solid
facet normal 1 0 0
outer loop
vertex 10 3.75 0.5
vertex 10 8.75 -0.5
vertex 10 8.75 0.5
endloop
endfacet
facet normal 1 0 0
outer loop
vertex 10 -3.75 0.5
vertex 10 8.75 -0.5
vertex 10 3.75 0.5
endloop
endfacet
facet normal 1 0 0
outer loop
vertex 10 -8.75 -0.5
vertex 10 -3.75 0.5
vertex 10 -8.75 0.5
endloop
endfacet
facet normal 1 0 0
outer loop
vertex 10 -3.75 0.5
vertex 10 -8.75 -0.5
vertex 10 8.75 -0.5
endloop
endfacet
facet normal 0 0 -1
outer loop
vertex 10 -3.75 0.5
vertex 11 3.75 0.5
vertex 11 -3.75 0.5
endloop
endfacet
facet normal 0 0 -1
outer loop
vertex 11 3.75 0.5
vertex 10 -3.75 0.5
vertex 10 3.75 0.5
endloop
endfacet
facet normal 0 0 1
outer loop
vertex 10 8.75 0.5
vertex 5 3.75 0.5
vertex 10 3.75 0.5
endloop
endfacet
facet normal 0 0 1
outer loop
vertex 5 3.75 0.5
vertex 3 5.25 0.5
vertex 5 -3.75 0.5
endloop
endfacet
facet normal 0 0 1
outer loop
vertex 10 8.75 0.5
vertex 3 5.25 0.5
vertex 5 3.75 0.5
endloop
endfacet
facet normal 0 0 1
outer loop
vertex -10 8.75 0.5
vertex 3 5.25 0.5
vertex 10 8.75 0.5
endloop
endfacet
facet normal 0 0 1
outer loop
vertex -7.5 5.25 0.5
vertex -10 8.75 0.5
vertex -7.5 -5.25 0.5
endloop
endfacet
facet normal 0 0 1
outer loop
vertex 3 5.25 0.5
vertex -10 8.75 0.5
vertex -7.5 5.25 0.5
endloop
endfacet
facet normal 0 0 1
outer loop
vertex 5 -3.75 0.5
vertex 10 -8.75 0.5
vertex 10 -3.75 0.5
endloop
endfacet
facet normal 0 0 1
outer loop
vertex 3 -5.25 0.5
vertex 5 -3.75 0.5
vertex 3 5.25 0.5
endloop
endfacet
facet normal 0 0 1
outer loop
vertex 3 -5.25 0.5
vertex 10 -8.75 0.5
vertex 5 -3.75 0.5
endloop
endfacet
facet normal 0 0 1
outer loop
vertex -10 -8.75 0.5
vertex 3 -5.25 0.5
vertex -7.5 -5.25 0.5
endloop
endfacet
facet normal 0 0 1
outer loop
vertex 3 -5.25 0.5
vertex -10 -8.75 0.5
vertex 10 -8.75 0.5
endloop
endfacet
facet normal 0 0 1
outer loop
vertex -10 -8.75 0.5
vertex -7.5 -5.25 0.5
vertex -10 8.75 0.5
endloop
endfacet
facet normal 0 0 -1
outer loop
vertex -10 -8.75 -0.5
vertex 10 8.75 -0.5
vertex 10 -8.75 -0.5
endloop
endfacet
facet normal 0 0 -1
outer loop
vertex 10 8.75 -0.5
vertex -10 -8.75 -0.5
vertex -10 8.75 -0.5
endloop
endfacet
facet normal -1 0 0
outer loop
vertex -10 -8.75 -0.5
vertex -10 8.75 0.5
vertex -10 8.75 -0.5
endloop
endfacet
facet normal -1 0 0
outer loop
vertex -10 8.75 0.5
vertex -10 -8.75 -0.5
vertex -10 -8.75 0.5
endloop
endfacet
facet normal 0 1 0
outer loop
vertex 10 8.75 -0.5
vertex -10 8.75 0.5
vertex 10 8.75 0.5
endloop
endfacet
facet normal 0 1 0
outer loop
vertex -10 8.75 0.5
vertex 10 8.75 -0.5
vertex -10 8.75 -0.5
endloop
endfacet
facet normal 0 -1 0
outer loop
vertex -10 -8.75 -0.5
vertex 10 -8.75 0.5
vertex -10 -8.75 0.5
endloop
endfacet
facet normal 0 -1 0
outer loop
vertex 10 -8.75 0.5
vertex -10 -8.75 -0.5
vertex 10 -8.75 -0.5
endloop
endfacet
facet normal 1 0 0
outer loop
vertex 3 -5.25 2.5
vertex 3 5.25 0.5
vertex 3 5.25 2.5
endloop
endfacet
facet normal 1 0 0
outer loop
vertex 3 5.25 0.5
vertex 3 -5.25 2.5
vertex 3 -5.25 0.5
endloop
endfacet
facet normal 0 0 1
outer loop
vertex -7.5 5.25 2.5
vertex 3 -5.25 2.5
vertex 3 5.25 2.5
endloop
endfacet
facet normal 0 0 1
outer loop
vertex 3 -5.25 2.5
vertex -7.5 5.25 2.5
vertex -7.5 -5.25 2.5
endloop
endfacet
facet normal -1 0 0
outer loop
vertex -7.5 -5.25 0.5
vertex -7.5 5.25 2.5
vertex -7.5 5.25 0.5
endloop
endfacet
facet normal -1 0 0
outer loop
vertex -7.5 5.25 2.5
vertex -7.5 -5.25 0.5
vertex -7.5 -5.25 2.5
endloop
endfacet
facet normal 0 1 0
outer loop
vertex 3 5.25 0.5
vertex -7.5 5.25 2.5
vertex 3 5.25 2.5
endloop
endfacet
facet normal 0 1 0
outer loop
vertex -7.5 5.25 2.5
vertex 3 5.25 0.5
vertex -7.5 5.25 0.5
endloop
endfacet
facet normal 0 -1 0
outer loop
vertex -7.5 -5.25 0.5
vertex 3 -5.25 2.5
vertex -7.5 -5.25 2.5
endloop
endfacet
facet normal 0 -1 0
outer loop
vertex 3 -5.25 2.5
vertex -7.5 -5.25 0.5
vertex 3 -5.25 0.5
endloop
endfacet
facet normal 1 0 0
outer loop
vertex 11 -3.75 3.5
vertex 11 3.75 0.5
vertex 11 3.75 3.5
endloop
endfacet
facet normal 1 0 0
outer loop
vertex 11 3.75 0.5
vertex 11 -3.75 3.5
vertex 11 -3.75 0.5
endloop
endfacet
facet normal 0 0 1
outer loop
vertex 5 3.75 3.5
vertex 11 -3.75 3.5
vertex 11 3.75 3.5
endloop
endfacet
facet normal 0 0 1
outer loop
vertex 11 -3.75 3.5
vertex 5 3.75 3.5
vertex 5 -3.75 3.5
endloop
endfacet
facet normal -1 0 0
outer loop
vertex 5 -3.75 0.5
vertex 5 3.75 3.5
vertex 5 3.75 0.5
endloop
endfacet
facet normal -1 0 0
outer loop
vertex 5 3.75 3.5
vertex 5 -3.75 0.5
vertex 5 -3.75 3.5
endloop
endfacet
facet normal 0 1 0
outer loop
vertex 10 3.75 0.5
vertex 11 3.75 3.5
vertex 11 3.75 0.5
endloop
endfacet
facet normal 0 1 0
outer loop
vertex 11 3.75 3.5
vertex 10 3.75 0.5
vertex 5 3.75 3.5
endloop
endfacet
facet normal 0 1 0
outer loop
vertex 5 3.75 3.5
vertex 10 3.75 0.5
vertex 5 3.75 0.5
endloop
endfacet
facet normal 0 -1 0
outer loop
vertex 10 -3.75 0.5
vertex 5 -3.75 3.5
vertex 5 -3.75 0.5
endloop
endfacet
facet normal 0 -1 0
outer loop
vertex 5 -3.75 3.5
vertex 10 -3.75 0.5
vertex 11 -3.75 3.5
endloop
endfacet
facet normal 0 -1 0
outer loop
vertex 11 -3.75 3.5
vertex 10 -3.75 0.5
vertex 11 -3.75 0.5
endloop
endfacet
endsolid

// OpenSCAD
module pcb_seeedstudioxiao() {
    union() {
        cube([20, 17.5, 1], true);
    
        translate([-4.75+2.5, 0, 1.5])
        cube([10.5, 10.5, 2], true);
        
        translate([8, 0, 2])
            cube([6, 7.5, 3], true);
    }
}

pcb_seeedstudioxiao();
